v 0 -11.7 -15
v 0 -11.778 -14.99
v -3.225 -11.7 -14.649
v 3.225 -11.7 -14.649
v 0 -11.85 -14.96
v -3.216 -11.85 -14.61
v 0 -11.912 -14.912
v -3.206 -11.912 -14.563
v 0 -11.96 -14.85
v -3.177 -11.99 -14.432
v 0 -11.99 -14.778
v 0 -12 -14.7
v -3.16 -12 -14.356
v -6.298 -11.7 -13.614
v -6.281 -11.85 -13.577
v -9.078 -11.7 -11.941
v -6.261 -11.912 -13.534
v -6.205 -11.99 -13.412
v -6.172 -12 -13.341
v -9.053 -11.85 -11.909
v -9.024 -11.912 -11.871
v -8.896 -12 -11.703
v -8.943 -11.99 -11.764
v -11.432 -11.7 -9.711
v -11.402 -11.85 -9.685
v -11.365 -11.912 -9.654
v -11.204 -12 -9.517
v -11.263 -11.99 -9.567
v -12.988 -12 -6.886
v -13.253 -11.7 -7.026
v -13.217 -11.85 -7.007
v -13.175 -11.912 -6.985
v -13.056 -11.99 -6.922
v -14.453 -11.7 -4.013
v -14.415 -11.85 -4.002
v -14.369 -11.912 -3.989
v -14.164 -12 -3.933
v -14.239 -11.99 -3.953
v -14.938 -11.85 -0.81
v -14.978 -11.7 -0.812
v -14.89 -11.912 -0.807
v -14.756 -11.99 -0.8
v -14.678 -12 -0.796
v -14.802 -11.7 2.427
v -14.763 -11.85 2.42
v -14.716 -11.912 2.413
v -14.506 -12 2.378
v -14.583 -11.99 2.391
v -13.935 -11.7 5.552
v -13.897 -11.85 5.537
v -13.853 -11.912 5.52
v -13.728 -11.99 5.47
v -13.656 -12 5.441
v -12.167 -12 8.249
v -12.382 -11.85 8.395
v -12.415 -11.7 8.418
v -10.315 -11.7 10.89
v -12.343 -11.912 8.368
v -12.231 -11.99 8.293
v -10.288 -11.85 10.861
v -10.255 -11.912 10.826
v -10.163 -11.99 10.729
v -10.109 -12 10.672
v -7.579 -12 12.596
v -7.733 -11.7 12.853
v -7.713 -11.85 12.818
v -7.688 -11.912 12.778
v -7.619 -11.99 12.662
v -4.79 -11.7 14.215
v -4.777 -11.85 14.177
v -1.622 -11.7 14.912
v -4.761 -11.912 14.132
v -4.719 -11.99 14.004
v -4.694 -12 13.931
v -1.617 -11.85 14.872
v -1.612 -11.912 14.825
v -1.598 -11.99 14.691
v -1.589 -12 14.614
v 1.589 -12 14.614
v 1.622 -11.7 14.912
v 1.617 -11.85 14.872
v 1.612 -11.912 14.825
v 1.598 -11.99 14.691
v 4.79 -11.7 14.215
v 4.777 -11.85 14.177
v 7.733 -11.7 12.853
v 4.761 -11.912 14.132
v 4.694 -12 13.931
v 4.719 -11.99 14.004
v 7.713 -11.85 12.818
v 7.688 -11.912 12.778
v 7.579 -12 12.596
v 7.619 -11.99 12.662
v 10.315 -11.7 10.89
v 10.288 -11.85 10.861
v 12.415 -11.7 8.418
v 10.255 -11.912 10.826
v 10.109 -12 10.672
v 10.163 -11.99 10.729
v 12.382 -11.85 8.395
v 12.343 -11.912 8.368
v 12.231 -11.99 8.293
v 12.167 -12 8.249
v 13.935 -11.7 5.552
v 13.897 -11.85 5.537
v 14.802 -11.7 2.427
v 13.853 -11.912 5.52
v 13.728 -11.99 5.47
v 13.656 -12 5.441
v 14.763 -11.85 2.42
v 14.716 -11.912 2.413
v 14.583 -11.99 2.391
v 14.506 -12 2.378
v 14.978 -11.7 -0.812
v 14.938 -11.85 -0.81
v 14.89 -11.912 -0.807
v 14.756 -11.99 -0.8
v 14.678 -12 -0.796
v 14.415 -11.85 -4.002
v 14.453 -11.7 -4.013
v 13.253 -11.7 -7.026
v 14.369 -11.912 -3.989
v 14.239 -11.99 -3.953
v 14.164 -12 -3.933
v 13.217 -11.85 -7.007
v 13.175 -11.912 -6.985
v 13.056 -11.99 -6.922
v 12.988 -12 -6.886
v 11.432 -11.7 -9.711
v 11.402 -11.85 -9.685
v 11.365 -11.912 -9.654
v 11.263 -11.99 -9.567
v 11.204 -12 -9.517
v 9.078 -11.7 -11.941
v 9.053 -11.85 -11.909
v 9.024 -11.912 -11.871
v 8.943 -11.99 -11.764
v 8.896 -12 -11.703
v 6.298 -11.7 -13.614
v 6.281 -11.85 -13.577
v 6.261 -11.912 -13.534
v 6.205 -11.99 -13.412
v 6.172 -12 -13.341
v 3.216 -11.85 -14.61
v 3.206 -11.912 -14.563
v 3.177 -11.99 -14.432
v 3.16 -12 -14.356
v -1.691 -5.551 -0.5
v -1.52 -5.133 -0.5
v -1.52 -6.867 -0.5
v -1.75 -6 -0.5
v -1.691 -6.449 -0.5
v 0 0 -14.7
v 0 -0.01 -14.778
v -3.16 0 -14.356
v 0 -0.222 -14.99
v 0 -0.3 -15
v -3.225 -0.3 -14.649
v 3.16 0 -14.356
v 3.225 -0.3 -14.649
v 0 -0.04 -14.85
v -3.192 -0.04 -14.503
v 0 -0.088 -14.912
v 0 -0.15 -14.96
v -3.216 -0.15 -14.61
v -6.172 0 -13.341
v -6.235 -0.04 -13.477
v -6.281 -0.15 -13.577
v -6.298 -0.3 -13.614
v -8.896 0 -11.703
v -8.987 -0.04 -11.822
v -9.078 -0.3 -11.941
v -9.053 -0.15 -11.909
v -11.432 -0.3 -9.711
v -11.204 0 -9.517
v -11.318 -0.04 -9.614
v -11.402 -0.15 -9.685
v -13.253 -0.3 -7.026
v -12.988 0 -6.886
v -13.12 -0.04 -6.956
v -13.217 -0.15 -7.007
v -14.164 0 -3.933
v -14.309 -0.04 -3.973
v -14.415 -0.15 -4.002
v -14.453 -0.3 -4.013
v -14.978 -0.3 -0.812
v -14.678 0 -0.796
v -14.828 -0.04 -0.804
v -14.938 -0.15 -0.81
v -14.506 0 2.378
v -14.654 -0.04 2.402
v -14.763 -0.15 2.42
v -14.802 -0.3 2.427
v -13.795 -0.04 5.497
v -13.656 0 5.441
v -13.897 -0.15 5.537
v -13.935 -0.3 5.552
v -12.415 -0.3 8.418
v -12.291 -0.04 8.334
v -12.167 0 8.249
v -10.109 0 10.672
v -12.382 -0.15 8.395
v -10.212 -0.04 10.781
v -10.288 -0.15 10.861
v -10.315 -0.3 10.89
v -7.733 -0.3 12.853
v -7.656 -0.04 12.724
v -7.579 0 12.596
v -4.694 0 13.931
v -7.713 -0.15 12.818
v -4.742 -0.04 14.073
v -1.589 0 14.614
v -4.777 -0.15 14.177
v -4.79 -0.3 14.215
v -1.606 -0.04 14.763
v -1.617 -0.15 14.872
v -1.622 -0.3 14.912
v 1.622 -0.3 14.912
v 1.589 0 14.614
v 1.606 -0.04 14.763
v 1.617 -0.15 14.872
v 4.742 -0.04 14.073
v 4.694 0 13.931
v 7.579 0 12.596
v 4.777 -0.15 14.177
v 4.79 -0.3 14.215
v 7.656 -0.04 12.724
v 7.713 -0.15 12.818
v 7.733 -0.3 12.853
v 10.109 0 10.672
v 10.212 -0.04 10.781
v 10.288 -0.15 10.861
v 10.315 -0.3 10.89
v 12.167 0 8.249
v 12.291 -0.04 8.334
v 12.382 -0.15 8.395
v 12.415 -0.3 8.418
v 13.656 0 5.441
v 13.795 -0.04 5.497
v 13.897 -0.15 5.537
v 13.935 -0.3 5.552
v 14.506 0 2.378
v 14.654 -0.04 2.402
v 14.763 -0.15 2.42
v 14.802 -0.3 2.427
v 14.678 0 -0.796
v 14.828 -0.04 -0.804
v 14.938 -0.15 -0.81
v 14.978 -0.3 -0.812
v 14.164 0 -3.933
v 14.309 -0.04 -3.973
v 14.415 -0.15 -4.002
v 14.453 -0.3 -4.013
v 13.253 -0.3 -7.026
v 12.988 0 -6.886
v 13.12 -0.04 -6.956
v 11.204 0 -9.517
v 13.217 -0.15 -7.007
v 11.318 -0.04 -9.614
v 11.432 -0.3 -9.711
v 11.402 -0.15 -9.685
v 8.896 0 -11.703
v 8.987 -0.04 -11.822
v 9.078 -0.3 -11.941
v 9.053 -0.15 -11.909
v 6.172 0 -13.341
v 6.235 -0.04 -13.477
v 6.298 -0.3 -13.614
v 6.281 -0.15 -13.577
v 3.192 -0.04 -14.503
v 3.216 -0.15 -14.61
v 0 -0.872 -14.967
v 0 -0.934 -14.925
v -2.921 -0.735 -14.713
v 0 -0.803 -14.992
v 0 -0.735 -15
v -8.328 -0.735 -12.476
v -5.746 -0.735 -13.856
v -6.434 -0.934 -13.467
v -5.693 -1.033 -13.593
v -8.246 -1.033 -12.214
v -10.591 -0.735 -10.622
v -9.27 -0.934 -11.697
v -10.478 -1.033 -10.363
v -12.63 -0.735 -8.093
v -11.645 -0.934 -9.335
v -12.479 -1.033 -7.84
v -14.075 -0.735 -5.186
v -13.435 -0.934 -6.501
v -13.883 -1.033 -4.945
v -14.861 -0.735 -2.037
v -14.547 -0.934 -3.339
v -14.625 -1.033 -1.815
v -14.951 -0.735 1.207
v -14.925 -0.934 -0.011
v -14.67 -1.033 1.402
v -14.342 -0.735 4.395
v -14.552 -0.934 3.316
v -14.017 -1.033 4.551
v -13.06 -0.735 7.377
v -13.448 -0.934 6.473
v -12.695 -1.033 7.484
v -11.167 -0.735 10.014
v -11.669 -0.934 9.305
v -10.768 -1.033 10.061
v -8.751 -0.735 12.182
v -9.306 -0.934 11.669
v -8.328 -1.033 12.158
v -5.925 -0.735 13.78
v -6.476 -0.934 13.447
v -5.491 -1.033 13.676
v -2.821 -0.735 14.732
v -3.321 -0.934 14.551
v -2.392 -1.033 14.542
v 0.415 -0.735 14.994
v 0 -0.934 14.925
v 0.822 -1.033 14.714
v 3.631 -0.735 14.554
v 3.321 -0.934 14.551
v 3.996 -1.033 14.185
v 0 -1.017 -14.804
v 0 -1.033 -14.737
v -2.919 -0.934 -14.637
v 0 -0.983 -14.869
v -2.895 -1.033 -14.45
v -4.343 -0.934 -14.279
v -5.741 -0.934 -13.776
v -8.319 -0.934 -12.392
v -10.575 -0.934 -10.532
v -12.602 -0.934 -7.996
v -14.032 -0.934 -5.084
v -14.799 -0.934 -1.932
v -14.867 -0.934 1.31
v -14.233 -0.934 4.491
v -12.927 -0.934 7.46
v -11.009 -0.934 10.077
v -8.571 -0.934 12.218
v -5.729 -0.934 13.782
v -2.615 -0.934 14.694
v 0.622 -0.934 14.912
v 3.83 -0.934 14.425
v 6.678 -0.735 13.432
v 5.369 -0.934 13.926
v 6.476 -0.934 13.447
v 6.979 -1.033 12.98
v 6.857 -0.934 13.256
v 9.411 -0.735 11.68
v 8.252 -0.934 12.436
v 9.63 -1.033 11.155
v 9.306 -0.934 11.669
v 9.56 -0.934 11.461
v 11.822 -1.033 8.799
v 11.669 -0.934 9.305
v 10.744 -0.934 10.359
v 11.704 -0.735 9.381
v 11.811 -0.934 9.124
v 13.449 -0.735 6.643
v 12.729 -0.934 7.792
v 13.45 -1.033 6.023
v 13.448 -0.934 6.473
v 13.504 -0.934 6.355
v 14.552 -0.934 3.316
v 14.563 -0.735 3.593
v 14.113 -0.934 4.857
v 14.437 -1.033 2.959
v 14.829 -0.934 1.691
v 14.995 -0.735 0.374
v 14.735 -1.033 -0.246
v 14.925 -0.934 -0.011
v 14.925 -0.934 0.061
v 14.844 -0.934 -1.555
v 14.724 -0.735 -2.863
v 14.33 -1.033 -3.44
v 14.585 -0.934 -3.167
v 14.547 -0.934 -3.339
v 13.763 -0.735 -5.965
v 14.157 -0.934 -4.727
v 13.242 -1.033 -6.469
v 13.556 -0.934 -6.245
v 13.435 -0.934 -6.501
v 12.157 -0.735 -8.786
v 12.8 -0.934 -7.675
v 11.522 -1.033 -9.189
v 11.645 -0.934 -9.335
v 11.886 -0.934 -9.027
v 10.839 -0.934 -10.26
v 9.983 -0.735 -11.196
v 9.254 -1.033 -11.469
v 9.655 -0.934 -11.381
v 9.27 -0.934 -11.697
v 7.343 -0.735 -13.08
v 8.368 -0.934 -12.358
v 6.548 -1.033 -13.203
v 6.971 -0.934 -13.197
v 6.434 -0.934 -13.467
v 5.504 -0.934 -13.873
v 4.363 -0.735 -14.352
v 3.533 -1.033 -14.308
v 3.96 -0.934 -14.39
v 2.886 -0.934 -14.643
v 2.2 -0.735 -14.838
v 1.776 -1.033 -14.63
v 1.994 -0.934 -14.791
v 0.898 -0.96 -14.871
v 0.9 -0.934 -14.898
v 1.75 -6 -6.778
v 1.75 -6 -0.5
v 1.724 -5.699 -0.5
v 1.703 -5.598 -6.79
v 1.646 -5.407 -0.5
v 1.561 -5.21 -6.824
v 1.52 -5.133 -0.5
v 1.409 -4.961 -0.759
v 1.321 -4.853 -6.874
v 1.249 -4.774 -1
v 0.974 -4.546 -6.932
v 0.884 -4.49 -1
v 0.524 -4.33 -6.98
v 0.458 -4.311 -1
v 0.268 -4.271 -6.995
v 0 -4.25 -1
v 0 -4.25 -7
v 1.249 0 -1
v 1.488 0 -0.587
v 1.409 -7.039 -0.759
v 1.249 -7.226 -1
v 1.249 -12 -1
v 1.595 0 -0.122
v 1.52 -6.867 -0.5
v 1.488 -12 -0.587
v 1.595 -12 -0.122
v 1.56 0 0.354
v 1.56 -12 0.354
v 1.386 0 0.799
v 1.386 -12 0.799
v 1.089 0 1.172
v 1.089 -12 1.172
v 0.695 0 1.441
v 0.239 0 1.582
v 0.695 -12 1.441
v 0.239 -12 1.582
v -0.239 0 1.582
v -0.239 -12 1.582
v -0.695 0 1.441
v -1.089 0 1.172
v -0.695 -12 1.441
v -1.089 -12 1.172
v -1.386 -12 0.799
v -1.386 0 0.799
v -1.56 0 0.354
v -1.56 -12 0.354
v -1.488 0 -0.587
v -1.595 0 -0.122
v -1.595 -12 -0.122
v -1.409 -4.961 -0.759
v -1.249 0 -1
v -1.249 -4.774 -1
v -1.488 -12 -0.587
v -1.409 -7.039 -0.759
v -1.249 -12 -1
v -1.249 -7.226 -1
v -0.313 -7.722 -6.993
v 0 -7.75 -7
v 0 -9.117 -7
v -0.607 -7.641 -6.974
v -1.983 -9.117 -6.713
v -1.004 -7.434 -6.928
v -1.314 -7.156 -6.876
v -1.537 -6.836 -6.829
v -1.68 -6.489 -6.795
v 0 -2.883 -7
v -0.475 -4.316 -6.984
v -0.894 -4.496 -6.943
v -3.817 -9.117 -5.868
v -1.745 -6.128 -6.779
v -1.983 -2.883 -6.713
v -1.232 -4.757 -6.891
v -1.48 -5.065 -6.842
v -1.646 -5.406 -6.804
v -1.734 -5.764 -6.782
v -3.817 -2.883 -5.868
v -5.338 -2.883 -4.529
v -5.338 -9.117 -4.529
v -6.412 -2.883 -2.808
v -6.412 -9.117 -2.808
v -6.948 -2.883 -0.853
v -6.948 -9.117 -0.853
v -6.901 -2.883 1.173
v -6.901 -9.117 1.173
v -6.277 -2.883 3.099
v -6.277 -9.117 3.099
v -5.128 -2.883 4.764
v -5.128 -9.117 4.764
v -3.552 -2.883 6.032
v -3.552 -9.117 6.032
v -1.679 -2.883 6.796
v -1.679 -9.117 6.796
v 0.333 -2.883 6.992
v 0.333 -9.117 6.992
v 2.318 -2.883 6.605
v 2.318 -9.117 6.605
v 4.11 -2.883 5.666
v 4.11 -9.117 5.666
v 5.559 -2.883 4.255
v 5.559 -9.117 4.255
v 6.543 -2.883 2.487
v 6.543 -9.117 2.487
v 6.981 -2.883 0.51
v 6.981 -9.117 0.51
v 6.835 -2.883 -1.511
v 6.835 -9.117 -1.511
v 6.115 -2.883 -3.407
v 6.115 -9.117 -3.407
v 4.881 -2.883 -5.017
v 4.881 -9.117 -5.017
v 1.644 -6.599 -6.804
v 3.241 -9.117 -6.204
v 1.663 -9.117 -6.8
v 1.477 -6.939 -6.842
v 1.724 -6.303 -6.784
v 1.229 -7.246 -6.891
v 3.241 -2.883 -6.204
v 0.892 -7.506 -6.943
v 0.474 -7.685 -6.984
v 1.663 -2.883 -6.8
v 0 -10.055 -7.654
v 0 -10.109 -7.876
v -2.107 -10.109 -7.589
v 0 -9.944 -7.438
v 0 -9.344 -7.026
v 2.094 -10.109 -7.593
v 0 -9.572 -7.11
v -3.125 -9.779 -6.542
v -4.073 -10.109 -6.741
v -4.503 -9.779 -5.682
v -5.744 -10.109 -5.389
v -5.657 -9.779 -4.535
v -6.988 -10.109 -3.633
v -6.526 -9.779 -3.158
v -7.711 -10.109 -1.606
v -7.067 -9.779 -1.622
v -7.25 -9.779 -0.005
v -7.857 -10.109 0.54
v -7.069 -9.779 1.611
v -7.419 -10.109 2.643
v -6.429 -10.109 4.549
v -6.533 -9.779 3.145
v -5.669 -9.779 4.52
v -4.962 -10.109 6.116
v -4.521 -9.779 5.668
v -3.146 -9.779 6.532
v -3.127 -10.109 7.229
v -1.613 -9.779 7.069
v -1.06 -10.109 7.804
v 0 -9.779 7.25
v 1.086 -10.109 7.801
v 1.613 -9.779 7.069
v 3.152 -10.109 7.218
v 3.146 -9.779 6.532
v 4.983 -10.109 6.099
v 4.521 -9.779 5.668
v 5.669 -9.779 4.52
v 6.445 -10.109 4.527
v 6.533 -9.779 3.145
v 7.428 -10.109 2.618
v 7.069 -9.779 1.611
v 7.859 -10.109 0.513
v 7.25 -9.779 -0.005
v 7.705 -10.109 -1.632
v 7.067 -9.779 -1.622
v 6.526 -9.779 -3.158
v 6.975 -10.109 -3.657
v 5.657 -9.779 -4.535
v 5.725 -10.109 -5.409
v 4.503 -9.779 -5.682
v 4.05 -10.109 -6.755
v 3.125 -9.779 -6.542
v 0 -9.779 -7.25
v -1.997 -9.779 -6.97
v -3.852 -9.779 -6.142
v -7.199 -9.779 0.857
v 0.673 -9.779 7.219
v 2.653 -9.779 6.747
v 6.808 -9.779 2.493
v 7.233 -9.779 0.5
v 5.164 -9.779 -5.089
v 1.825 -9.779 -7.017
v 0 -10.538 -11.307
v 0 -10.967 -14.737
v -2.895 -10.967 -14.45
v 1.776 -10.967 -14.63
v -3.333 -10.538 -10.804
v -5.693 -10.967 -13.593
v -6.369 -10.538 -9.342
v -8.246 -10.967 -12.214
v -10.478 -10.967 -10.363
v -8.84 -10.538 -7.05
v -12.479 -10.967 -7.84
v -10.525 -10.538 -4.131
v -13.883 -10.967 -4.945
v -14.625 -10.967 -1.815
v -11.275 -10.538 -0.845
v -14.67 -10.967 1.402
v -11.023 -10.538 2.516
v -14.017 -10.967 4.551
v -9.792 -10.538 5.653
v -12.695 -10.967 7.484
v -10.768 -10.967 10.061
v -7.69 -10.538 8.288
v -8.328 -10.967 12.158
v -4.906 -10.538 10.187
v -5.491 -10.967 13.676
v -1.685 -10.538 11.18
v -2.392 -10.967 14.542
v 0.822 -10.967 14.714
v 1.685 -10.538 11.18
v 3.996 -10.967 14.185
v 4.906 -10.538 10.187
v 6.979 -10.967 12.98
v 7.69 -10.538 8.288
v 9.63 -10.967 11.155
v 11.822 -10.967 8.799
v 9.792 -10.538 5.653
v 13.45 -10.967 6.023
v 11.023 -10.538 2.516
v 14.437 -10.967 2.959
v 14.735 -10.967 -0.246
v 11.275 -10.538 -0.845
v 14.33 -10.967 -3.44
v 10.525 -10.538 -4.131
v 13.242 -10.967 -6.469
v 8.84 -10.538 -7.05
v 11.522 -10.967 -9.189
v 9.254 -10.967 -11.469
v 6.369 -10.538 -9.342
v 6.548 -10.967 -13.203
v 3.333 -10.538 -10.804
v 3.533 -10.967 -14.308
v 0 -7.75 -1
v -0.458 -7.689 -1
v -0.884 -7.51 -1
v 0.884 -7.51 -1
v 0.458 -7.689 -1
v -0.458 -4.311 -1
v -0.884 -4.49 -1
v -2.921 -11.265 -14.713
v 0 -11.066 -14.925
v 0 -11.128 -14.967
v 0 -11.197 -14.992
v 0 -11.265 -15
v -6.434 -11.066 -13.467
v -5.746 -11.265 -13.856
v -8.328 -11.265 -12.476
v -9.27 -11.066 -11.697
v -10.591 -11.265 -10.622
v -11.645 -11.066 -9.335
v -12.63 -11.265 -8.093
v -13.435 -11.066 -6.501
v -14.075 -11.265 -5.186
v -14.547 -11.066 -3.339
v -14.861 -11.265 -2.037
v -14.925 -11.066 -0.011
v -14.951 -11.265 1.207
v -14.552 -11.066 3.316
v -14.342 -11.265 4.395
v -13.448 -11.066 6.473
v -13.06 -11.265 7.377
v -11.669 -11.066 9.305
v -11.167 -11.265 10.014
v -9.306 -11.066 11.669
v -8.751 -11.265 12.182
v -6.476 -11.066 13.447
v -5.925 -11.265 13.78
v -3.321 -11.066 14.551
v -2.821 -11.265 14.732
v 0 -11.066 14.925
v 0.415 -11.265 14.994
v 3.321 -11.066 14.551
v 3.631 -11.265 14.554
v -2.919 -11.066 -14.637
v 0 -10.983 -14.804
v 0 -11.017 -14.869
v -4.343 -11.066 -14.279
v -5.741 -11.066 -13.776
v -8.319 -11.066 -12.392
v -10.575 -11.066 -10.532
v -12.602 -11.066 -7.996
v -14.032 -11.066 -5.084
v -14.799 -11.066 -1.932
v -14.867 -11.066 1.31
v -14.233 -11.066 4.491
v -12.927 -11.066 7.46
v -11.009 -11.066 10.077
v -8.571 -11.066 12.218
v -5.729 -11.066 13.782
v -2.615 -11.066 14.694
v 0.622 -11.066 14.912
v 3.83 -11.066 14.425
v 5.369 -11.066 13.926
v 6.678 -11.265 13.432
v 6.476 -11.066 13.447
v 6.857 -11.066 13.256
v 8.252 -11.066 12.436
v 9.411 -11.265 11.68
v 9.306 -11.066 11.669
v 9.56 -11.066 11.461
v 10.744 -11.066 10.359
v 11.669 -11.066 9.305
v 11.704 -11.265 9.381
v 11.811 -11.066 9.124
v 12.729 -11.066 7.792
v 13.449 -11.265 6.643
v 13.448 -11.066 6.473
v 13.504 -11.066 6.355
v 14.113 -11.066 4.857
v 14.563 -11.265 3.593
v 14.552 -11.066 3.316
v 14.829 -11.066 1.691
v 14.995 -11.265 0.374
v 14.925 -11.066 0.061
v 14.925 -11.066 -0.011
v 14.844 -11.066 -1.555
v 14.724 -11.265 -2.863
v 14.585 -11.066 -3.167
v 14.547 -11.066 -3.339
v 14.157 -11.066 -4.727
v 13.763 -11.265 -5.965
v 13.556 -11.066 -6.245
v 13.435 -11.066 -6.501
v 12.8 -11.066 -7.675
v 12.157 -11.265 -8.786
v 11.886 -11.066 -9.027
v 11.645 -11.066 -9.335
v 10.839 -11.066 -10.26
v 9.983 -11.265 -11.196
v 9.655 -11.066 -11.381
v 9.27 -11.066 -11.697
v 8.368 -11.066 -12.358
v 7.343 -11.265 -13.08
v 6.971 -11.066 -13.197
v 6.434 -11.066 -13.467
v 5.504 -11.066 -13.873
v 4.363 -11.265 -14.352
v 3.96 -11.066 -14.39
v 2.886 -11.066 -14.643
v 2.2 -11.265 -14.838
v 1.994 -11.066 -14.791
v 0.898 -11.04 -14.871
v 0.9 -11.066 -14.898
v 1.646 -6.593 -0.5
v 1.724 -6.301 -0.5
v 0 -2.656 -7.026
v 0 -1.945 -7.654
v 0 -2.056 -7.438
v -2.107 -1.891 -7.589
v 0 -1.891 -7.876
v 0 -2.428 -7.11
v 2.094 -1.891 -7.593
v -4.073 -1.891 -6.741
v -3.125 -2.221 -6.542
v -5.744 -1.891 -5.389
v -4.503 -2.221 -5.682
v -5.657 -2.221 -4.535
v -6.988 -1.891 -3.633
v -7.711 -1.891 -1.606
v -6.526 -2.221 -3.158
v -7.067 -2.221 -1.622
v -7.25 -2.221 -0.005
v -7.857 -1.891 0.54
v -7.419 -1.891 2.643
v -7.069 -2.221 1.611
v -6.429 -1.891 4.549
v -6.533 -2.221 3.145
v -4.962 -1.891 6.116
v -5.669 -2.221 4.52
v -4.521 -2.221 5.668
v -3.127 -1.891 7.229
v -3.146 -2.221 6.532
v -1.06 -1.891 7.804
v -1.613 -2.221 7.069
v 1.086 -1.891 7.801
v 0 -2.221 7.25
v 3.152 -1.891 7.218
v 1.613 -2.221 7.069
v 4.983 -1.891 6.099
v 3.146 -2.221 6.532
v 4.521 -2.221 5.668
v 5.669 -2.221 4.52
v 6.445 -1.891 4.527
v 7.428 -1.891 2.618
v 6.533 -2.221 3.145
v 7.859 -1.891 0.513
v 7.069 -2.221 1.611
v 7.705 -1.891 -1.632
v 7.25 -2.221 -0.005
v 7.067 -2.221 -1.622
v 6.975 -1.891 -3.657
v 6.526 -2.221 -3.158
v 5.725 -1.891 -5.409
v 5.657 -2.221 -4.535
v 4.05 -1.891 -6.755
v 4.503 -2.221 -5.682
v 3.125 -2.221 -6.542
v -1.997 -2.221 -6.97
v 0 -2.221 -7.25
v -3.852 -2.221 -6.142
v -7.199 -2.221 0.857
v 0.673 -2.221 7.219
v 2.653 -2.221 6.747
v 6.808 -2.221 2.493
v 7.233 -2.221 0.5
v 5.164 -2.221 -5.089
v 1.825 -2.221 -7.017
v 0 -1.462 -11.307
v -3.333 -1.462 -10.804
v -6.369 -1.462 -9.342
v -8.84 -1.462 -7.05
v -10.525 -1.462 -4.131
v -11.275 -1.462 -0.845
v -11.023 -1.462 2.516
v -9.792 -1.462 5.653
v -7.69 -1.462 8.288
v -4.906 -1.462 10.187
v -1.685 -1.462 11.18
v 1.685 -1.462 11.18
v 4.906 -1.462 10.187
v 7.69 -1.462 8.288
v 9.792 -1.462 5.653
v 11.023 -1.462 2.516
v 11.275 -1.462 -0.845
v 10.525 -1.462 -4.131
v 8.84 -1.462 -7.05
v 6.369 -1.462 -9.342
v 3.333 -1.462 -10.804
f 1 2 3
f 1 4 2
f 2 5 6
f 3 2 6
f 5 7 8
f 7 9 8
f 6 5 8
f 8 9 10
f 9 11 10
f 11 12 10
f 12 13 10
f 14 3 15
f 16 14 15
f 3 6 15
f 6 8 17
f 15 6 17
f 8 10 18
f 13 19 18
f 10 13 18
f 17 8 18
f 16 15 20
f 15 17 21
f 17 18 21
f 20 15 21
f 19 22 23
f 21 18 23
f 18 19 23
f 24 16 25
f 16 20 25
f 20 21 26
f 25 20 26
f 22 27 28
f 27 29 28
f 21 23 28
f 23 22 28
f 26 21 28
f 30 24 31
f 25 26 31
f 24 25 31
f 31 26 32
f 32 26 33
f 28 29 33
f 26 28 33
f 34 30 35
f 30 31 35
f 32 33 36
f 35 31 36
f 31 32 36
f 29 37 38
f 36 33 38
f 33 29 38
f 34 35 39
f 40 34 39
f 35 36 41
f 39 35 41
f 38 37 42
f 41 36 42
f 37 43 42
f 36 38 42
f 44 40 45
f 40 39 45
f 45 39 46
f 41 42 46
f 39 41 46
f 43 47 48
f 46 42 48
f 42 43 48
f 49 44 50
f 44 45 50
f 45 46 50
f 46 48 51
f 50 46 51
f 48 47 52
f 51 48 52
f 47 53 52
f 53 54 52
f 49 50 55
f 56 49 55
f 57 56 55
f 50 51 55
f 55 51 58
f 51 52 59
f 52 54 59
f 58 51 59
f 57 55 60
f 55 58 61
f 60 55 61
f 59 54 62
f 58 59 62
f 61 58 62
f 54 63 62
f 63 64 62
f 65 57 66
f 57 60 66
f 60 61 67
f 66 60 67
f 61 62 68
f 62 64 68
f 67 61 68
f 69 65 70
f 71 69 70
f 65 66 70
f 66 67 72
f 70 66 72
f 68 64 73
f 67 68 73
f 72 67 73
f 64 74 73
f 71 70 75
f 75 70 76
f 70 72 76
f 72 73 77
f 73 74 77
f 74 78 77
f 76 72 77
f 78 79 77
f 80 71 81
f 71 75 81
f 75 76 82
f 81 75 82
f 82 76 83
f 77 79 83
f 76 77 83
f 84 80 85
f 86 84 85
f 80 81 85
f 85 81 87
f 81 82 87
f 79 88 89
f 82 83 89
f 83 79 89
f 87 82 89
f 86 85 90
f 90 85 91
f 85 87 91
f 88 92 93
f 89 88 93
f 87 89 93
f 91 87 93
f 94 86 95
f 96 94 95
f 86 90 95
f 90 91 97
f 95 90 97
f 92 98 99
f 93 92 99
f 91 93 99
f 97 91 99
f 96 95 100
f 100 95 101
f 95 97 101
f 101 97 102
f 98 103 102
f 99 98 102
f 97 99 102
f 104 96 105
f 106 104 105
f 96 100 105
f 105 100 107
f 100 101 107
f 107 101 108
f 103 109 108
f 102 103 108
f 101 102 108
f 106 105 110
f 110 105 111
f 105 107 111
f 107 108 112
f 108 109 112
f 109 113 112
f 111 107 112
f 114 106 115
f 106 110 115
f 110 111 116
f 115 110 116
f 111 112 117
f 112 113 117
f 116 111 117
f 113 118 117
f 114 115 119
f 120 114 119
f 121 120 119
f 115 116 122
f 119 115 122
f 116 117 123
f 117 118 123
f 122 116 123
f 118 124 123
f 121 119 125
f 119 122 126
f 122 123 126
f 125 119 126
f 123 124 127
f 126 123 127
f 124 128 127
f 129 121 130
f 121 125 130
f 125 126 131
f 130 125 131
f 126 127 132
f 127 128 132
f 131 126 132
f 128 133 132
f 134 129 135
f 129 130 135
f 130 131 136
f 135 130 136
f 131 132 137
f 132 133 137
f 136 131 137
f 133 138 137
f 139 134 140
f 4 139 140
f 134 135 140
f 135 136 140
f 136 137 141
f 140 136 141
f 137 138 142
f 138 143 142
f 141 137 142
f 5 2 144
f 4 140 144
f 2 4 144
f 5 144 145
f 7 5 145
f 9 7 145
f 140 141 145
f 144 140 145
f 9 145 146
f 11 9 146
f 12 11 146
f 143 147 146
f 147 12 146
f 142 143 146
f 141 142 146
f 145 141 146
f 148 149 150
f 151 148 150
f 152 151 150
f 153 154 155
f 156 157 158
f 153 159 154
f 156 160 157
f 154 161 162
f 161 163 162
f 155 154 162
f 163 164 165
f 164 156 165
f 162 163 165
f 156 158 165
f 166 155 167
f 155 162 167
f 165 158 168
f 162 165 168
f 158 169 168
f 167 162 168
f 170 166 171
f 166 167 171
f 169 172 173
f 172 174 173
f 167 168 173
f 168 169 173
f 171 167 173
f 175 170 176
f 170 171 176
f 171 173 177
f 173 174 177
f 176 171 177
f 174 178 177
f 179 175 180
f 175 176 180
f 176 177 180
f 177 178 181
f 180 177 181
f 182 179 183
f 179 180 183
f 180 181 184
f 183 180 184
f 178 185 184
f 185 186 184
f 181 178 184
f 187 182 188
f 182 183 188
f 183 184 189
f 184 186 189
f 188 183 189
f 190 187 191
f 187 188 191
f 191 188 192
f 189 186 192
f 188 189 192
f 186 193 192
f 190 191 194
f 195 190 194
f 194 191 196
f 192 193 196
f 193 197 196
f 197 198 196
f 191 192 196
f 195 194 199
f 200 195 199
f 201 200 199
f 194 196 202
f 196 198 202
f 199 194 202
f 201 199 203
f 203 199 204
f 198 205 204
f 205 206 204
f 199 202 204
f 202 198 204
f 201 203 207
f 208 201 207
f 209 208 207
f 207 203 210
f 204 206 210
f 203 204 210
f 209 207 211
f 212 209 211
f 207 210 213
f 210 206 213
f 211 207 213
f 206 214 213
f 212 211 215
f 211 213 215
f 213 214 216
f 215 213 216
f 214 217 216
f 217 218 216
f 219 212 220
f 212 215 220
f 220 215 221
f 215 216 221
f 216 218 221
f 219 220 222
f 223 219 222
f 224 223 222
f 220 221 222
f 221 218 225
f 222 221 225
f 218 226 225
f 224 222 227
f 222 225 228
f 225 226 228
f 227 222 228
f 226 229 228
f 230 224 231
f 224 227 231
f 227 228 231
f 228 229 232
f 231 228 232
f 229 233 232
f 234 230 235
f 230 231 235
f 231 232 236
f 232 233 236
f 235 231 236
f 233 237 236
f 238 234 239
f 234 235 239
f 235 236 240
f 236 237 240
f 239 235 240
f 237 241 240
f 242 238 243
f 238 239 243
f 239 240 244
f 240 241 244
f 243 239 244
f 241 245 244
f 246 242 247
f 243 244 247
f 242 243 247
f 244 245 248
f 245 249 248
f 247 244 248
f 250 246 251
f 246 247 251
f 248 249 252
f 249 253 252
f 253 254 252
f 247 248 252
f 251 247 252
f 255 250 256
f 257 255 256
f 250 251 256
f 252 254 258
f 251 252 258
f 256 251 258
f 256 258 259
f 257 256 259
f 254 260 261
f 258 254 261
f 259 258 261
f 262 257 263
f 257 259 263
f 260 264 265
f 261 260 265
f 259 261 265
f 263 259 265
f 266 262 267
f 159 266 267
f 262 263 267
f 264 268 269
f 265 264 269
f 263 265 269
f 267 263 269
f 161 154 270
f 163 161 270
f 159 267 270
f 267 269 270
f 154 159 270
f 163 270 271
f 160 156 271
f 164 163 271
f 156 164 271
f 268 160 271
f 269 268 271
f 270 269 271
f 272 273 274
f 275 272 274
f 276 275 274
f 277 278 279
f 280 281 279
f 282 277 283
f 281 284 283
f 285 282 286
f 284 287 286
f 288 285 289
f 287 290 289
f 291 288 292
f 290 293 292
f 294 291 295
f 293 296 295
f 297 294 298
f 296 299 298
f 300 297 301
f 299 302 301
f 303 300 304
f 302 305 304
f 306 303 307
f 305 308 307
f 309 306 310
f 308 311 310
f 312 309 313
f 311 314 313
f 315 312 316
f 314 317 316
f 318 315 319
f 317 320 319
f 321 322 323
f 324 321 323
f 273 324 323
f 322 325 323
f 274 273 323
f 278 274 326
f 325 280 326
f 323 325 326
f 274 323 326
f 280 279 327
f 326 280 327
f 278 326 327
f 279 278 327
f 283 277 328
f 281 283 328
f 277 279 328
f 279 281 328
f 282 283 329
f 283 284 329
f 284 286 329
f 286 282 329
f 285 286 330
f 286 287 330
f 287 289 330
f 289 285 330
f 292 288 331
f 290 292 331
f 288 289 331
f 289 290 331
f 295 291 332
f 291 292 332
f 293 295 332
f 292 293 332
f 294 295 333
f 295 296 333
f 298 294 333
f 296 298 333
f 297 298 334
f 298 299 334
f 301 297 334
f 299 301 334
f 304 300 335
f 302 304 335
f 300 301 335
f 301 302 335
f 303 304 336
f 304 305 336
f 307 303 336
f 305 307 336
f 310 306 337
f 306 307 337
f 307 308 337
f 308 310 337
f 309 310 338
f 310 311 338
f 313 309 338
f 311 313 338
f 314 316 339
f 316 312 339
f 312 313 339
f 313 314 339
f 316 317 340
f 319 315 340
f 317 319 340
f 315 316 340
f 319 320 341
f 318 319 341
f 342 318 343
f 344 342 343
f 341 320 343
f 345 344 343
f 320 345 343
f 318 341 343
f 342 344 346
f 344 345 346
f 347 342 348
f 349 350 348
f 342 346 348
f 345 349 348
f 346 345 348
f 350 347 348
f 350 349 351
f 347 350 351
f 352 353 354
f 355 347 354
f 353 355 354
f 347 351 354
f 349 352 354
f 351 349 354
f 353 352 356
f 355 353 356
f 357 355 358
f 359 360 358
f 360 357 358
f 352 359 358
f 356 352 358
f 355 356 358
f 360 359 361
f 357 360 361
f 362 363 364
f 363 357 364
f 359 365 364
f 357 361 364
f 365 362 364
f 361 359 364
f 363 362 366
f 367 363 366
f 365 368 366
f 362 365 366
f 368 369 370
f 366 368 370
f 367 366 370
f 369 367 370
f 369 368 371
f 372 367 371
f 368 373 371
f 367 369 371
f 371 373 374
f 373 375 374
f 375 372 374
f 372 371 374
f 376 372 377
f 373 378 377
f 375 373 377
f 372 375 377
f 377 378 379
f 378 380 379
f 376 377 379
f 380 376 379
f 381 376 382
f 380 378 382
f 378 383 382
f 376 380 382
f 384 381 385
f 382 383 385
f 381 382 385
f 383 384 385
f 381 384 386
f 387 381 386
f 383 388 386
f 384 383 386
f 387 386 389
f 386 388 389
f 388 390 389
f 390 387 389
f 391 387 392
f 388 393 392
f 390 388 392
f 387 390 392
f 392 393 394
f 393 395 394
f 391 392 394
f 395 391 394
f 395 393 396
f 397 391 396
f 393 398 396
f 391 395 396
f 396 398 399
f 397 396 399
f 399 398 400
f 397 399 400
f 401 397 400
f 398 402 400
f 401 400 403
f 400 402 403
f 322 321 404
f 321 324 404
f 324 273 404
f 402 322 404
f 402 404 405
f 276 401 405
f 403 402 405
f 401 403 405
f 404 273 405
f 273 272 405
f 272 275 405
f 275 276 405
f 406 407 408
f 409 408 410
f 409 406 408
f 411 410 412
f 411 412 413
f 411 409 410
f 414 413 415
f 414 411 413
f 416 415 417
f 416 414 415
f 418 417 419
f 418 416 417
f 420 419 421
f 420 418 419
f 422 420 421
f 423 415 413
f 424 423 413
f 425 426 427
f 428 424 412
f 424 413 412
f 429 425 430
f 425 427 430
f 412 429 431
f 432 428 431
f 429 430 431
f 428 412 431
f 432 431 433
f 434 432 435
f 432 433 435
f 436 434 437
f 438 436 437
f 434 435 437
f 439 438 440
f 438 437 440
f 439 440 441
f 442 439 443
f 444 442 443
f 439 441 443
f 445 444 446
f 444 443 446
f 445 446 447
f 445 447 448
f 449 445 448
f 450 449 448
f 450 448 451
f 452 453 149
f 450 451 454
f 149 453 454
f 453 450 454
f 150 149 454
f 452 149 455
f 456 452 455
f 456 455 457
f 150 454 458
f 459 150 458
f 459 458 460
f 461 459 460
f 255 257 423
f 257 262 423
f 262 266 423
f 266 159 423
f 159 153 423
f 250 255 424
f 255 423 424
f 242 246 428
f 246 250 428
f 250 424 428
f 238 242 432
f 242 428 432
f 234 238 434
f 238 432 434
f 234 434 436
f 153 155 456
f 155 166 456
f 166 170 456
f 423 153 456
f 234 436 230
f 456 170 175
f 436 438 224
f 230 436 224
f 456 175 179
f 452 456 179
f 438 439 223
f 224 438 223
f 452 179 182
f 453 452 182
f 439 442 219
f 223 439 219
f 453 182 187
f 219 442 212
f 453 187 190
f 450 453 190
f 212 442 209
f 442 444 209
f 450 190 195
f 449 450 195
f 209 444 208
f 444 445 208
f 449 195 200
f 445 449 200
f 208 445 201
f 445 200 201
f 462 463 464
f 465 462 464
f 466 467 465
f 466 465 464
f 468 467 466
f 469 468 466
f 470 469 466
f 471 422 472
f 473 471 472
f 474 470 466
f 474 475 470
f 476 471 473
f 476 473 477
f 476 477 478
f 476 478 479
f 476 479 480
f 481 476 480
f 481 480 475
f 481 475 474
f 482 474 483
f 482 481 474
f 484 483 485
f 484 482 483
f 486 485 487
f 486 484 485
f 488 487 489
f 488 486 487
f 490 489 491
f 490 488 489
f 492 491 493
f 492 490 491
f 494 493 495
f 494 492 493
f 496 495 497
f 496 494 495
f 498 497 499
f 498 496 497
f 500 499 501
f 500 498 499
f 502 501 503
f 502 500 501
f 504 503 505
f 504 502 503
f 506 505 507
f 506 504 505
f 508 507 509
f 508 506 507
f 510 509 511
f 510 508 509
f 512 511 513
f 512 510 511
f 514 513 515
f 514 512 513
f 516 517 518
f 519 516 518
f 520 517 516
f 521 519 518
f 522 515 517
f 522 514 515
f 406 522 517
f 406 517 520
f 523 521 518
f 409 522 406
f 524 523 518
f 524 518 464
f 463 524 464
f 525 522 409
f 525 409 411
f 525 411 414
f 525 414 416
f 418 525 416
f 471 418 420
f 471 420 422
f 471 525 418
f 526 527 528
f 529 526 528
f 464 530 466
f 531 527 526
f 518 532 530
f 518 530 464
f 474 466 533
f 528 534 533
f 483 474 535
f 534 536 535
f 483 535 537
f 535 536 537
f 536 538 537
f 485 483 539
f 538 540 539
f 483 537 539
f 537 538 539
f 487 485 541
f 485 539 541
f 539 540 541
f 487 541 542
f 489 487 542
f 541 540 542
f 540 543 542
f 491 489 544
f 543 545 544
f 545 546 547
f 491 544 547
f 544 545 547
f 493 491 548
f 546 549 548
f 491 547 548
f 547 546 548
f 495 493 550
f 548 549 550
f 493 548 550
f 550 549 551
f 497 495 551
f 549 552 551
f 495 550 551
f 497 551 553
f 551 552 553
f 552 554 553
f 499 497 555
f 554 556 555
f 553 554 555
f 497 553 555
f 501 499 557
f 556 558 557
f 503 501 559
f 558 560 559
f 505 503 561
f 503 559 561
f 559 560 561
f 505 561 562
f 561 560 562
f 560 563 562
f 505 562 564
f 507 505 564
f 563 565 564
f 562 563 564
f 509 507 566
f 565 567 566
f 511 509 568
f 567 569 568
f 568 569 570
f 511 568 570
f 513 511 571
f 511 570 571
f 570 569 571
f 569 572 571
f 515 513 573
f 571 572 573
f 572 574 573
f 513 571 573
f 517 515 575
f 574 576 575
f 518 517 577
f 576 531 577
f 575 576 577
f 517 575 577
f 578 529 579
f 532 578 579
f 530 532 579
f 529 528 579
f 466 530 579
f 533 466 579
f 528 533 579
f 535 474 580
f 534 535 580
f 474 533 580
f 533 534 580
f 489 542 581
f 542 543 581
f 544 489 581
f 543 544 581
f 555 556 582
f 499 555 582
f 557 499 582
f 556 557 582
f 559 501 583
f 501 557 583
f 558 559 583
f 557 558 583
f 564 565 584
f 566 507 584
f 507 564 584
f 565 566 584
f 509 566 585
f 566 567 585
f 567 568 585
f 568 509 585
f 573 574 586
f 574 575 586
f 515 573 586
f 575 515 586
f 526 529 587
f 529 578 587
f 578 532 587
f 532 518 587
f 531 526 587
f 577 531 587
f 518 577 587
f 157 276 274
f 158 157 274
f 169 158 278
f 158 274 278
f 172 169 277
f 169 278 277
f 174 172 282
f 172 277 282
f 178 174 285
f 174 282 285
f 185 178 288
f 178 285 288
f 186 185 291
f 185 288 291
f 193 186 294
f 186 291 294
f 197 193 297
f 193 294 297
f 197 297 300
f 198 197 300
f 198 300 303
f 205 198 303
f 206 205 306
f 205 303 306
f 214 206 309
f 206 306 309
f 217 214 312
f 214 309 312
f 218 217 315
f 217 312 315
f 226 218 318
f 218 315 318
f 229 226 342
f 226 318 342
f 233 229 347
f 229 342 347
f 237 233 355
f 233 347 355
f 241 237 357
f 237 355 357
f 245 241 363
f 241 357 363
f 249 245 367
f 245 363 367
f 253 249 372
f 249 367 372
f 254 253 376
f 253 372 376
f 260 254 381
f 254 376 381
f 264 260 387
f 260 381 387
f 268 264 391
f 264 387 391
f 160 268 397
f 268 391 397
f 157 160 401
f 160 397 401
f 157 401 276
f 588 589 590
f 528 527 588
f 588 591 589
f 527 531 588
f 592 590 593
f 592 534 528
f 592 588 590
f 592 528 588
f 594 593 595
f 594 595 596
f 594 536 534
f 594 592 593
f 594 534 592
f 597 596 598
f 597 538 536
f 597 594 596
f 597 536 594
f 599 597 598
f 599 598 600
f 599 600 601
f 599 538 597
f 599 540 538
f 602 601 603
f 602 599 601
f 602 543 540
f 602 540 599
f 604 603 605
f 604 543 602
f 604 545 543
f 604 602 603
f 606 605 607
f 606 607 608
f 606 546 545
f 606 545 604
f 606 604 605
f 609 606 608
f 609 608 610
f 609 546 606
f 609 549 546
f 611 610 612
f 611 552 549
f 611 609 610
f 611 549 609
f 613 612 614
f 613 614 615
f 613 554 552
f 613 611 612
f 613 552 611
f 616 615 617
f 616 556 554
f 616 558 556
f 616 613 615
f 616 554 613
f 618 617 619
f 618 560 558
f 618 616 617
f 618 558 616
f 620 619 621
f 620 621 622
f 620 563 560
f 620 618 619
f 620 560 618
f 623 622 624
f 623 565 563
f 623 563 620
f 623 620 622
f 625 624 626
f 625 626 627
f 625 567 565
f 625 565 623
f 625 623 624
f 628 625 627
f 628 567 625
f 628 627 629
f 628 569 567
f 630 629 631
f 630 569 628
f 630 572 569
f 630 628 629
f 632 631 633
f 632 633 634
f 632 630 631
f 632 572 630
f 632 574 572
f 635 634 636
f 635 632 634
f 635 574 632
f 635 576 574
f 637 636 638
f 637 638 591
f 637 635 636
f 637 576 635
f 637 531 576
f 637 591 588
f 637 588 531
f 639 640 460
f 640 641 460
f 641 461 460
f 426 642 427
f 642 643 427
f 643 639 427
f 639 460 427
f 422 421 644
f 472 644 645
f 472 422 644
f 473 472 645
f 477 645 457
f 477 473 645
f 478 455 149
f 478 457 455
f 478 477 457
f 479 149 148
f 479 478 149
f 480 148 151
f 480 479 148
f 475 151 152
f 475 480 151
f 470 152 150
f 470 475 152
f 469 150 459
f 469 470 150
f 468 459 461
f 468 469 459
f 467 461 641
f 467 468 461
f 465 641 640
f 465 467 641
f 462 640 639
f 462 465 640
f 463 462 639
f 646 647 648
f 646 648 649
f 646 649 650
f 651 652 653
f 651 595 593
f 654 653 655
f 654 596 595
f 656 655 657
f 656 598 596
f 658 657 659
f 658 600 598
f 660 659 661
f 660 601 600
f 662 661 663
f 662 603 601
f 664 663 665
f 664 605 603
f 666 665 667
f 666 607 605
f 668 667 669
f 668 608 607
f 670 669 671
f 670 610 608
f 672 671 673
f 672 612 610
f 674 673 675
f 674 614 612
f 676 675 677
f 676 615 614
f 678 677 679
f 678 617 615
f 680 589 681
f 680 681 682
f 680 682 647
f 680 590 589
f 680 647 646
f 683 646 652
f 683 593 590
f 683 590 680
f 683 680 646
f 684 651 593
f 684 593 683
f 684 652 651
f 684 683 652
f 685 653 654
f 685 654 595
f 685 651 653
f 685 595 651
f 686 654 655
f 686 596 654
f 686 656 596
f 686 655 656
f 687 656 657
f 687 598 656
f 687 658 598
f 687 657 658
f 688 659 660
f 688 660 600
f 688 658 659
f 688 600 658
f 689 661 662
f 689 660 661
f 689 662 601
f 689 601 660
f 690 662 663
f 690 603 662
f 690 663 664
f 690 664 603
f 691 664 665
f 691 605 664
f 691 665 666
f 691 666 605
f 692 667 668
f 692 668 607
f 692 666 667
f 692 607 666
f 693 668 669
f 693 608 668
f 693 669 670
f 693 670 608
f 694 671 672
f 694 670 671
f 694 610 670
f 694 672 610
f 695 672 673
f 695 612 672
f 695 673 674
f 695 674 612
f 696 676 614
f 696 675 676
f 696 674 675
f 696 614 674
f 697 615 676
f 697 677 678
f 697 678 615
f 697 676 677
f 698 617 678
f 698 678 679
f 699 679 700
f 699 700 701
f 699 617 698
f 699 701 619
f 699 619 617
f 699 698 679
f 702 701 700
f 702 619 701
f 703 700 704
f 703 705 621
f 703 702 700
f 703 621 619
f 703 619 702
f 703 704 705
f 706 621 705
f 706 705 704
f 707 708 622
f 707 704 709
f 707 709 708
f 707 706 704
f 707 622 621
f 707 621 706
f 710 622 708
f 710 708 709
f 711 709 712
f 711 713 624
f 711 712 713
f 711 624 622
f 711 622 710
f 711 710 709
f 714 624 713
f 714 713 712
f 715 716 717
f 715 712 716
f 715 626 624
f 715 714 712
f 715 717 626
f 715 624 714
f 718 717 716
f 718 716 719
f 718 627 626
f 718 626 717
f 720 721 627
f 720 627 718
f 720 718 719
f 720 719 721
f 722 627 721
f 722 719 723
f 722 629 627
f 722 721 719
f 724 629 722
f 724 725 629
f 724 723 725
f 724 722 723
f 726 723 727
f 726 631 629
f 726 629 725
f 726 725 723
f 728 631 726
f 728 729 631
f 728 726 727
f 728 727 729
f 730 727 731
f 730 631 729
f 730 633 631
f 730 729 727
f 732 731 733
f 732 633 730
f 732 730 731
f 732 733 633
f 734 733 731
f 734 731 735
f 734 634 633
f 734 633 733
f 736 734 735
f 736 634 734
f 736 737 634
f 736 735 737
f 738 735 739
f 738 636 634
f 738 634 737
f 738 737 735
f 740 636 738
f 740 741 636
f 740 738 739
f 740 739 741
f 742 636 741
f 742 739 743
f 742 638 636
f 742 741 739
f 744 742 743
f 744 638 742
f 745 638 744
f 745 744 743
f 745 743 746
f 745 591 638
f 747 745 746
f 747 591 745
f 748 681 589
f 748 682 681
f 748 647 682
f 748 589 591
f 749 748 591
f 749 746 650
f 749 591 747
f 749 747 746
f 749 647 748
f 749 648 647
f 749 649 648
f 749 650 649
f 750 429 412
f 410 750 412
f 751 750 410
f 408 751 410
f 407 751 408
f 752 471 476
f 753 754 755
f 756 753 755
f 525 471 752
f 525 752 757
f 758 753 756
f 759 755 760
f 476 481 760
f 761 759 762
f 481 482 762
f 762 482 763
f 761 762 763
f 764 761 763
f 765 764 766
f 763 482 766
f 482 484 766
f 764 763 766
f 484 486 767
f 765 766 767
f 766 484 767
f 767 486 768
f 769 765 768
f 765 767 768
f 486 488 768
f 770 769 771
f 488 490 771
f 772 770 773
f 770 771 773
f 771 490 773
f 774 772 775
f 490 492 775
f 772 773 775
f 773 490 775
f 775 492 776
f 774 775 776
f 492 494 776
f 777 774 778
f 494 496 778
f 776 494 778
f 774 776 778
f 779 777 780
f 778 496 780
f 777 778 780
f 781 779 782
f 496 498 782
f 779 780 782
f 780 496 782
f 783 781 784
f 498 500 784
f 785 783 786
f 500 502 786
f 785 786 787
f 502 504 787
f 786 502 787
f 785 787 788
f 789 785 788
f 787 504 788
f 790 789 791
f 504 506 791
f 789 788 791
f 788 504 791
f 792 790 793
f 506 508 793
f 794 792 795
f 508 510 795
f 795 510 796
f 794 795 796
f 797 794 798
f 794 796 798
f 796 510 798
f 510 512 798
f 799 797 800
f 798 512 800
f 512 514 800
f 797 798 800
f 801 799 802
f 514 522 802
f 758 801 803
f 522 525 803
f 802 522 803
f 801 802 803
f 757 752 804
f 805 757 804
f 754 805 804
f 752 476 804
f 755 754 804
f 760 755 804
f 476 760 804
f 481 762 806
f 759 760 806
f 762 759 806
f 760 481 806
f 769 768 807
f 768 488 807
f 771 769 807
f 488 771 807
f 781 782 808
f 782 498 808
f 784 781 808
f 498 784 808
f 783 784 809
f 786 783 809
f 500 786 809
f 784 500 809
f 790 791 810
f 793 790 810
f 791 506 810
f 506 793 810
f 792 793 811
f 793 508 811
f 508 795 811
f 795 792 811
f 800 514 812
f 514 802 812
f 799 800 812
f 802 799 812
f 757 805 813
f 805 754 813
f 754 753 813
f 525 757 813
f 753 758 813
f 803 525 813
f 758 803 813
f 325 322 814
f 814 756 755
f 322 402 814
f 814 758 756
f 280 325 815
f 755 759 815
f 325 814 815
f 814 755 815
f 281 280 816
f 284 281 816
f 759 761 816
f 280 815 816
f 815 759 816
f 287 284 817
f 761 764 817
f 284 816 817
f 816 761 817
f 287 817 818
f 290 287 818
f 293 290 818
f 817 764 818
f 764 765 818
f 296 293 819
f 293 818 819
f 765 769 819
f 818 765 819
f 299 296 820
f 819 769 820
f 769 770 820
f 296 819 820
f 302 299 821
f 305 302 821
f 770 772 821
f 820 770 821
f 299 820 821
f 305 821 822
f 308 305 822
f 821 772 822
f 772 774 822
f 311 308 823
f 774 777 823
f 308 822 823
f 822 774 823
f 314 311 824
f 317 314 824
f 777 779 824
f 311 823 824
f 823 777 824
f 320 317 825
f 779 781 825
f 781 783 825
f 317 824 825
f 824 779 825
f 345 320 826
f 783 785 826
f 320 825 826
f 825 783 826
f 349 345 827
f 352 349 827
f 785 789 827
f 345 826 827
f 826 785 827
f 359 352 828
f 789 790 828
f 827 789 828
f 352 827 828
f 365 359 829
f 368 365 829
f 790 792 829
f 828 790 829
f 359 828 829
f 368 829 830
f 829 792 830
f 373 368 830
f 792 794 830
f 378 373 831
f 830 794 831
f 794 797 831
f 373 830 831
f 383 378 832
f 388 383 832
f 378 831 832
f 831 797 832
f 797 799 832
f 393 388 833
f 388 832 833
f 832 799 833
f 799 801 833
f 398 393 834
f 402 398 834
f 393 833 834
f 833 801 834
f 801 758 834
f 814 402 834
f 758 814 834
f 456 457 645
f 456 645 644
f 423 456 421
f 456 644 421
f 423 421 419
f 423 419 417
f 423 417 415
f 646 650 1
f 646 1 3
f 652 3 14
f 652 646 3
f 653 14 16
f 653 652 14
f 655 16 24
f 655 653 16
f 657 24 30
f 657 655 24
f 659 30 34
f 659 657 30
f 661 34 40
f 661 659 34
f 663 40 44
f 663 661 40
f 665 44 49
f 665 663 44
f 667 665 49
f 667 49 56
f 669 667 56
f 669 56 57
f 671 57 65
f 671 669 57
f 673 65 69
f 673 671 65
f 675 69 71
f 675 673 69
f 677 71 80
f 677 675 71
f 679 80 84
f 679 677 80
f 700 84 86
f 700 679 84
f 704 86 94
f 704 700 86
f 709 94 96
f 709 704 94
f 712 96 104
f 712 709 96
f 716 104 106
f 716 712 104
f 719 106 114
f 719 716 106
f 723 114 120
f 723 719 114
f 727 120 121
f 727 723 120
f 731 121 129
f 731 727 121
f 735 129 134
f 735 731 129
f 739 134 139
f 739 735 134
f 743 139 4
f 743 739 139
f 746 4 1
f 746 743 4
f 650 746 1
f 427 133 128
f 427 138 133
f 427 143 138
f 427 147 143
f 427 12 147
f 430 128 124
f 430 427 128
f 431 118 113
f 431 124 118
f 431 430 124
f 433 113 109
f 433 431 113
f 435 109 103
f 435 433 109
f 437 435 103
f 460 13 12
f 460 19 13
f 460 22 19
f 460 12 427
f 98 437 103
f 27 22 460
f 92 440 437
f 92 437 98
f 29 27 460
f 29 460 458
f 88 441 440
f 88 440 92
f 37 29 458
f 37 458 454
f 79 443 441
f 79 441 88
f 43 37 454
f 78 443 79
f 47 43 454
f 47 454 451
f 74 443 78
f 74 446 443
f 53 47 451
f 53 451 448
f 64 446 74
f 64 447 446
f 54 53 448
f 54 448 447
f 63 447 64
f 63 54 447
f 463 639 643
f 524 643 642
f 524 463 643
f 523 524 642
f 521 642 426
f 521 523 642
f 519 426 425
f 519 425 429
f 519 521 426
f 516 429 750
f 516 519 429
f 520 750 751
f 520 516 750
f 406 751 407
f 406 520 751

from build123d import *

# Parameters (mm, degrees)
CUT_EXTRUDE1_START = -12
CUT_EXTRUDE1_DEPTH = 37.372115214
FILLET1_R          = 1
FILLET2_R          = 0.3
CUT_EXTRUDE2_DEPTH = 10.5


with BuildPart() as part:
    # Sketch1 → Revolve1 (revolve)
    with BuildSketch(Plane.XY, mode=Mode.PRIVATE) as revolve1_sk:
        Polygon((0, 0), (-15, 0), (-15, -1), (-7, -2), (-7, -6), (0, -6), align=None)
    revolve1 = revolve(revolve1_sk.sketch.rotate(Axis((0, -6, 0), (0, 1, 0)), 270), axis=Axis((0, -6, 0), (0, 1, 0)))

    # Mirror1: Revolve1 across plane
    add(revolve1.mirror(Plane(origin=(-7, -6, 0), x_dir=(0, 0, 1), z_dir=(0, 1, 0))))

    # Sketch2 → Cut-Extrude1 (cut, through all)
    with BuildSketch(Plane(origin=(0, 0, 0), x_dir=(1, 0, 0), z_dir=(0, 1, 0)).offset(CUT_EXTRUDE1_START)):
        with BuildLine():
            Line((-1.2489996, 1), (1.2489996, 1))
            ThreePointArc((1.2489996, 1), (0, -1.6), (-1.2489996, 1))
        make_face()
    extrude(amount=CUT_EXTRUDE1_DEPTH, mode=Mode.SUBTRACT)

    # Fillet1
    fillet1_edges = [part.edges().sort_by_distance(p)[0] for p in [
        (0, -10, 7),
        (0, -2, 7),
    ]]
    fillet(fillet1_edges, radius=FILLET1_R)

    # Fillet2
    fillet2_edges = [part.edges().sort_by_distance(p)[0] for p in [
        (0, -12, 15),
        (0, -11, 15),
        (0, -1, 15),
        (0, 0, 15),
    ]]
    fillet(fillet2_edges, radius=FILLET2_R)

    # Sketch3 → Cut-Extrude2 (cut)
    with BuildSketch(Plane.XY.offset(-11)):
        with BuildLine():
            ThreePointArc((1.75, -6), (1.237436867, -4.762563133), (0, -4.25))
            Line((0, -4.25), (0, -7.75))
            ThreePointArc((0, -7.75), (1.237436867, -7.237436867), (1.75, -6))
        make_face()
        with BuildLine():
            Line((0, -7.75), (0, -4.25))
            ThreePointArc((0, -4.25), (-1.75, -6), (0, -7.75))
        make_face()
    extrude(amount=CUT_EXTRUDE2_DEPTH, mode=Mode.SUBTRACT)


solid = part.part
